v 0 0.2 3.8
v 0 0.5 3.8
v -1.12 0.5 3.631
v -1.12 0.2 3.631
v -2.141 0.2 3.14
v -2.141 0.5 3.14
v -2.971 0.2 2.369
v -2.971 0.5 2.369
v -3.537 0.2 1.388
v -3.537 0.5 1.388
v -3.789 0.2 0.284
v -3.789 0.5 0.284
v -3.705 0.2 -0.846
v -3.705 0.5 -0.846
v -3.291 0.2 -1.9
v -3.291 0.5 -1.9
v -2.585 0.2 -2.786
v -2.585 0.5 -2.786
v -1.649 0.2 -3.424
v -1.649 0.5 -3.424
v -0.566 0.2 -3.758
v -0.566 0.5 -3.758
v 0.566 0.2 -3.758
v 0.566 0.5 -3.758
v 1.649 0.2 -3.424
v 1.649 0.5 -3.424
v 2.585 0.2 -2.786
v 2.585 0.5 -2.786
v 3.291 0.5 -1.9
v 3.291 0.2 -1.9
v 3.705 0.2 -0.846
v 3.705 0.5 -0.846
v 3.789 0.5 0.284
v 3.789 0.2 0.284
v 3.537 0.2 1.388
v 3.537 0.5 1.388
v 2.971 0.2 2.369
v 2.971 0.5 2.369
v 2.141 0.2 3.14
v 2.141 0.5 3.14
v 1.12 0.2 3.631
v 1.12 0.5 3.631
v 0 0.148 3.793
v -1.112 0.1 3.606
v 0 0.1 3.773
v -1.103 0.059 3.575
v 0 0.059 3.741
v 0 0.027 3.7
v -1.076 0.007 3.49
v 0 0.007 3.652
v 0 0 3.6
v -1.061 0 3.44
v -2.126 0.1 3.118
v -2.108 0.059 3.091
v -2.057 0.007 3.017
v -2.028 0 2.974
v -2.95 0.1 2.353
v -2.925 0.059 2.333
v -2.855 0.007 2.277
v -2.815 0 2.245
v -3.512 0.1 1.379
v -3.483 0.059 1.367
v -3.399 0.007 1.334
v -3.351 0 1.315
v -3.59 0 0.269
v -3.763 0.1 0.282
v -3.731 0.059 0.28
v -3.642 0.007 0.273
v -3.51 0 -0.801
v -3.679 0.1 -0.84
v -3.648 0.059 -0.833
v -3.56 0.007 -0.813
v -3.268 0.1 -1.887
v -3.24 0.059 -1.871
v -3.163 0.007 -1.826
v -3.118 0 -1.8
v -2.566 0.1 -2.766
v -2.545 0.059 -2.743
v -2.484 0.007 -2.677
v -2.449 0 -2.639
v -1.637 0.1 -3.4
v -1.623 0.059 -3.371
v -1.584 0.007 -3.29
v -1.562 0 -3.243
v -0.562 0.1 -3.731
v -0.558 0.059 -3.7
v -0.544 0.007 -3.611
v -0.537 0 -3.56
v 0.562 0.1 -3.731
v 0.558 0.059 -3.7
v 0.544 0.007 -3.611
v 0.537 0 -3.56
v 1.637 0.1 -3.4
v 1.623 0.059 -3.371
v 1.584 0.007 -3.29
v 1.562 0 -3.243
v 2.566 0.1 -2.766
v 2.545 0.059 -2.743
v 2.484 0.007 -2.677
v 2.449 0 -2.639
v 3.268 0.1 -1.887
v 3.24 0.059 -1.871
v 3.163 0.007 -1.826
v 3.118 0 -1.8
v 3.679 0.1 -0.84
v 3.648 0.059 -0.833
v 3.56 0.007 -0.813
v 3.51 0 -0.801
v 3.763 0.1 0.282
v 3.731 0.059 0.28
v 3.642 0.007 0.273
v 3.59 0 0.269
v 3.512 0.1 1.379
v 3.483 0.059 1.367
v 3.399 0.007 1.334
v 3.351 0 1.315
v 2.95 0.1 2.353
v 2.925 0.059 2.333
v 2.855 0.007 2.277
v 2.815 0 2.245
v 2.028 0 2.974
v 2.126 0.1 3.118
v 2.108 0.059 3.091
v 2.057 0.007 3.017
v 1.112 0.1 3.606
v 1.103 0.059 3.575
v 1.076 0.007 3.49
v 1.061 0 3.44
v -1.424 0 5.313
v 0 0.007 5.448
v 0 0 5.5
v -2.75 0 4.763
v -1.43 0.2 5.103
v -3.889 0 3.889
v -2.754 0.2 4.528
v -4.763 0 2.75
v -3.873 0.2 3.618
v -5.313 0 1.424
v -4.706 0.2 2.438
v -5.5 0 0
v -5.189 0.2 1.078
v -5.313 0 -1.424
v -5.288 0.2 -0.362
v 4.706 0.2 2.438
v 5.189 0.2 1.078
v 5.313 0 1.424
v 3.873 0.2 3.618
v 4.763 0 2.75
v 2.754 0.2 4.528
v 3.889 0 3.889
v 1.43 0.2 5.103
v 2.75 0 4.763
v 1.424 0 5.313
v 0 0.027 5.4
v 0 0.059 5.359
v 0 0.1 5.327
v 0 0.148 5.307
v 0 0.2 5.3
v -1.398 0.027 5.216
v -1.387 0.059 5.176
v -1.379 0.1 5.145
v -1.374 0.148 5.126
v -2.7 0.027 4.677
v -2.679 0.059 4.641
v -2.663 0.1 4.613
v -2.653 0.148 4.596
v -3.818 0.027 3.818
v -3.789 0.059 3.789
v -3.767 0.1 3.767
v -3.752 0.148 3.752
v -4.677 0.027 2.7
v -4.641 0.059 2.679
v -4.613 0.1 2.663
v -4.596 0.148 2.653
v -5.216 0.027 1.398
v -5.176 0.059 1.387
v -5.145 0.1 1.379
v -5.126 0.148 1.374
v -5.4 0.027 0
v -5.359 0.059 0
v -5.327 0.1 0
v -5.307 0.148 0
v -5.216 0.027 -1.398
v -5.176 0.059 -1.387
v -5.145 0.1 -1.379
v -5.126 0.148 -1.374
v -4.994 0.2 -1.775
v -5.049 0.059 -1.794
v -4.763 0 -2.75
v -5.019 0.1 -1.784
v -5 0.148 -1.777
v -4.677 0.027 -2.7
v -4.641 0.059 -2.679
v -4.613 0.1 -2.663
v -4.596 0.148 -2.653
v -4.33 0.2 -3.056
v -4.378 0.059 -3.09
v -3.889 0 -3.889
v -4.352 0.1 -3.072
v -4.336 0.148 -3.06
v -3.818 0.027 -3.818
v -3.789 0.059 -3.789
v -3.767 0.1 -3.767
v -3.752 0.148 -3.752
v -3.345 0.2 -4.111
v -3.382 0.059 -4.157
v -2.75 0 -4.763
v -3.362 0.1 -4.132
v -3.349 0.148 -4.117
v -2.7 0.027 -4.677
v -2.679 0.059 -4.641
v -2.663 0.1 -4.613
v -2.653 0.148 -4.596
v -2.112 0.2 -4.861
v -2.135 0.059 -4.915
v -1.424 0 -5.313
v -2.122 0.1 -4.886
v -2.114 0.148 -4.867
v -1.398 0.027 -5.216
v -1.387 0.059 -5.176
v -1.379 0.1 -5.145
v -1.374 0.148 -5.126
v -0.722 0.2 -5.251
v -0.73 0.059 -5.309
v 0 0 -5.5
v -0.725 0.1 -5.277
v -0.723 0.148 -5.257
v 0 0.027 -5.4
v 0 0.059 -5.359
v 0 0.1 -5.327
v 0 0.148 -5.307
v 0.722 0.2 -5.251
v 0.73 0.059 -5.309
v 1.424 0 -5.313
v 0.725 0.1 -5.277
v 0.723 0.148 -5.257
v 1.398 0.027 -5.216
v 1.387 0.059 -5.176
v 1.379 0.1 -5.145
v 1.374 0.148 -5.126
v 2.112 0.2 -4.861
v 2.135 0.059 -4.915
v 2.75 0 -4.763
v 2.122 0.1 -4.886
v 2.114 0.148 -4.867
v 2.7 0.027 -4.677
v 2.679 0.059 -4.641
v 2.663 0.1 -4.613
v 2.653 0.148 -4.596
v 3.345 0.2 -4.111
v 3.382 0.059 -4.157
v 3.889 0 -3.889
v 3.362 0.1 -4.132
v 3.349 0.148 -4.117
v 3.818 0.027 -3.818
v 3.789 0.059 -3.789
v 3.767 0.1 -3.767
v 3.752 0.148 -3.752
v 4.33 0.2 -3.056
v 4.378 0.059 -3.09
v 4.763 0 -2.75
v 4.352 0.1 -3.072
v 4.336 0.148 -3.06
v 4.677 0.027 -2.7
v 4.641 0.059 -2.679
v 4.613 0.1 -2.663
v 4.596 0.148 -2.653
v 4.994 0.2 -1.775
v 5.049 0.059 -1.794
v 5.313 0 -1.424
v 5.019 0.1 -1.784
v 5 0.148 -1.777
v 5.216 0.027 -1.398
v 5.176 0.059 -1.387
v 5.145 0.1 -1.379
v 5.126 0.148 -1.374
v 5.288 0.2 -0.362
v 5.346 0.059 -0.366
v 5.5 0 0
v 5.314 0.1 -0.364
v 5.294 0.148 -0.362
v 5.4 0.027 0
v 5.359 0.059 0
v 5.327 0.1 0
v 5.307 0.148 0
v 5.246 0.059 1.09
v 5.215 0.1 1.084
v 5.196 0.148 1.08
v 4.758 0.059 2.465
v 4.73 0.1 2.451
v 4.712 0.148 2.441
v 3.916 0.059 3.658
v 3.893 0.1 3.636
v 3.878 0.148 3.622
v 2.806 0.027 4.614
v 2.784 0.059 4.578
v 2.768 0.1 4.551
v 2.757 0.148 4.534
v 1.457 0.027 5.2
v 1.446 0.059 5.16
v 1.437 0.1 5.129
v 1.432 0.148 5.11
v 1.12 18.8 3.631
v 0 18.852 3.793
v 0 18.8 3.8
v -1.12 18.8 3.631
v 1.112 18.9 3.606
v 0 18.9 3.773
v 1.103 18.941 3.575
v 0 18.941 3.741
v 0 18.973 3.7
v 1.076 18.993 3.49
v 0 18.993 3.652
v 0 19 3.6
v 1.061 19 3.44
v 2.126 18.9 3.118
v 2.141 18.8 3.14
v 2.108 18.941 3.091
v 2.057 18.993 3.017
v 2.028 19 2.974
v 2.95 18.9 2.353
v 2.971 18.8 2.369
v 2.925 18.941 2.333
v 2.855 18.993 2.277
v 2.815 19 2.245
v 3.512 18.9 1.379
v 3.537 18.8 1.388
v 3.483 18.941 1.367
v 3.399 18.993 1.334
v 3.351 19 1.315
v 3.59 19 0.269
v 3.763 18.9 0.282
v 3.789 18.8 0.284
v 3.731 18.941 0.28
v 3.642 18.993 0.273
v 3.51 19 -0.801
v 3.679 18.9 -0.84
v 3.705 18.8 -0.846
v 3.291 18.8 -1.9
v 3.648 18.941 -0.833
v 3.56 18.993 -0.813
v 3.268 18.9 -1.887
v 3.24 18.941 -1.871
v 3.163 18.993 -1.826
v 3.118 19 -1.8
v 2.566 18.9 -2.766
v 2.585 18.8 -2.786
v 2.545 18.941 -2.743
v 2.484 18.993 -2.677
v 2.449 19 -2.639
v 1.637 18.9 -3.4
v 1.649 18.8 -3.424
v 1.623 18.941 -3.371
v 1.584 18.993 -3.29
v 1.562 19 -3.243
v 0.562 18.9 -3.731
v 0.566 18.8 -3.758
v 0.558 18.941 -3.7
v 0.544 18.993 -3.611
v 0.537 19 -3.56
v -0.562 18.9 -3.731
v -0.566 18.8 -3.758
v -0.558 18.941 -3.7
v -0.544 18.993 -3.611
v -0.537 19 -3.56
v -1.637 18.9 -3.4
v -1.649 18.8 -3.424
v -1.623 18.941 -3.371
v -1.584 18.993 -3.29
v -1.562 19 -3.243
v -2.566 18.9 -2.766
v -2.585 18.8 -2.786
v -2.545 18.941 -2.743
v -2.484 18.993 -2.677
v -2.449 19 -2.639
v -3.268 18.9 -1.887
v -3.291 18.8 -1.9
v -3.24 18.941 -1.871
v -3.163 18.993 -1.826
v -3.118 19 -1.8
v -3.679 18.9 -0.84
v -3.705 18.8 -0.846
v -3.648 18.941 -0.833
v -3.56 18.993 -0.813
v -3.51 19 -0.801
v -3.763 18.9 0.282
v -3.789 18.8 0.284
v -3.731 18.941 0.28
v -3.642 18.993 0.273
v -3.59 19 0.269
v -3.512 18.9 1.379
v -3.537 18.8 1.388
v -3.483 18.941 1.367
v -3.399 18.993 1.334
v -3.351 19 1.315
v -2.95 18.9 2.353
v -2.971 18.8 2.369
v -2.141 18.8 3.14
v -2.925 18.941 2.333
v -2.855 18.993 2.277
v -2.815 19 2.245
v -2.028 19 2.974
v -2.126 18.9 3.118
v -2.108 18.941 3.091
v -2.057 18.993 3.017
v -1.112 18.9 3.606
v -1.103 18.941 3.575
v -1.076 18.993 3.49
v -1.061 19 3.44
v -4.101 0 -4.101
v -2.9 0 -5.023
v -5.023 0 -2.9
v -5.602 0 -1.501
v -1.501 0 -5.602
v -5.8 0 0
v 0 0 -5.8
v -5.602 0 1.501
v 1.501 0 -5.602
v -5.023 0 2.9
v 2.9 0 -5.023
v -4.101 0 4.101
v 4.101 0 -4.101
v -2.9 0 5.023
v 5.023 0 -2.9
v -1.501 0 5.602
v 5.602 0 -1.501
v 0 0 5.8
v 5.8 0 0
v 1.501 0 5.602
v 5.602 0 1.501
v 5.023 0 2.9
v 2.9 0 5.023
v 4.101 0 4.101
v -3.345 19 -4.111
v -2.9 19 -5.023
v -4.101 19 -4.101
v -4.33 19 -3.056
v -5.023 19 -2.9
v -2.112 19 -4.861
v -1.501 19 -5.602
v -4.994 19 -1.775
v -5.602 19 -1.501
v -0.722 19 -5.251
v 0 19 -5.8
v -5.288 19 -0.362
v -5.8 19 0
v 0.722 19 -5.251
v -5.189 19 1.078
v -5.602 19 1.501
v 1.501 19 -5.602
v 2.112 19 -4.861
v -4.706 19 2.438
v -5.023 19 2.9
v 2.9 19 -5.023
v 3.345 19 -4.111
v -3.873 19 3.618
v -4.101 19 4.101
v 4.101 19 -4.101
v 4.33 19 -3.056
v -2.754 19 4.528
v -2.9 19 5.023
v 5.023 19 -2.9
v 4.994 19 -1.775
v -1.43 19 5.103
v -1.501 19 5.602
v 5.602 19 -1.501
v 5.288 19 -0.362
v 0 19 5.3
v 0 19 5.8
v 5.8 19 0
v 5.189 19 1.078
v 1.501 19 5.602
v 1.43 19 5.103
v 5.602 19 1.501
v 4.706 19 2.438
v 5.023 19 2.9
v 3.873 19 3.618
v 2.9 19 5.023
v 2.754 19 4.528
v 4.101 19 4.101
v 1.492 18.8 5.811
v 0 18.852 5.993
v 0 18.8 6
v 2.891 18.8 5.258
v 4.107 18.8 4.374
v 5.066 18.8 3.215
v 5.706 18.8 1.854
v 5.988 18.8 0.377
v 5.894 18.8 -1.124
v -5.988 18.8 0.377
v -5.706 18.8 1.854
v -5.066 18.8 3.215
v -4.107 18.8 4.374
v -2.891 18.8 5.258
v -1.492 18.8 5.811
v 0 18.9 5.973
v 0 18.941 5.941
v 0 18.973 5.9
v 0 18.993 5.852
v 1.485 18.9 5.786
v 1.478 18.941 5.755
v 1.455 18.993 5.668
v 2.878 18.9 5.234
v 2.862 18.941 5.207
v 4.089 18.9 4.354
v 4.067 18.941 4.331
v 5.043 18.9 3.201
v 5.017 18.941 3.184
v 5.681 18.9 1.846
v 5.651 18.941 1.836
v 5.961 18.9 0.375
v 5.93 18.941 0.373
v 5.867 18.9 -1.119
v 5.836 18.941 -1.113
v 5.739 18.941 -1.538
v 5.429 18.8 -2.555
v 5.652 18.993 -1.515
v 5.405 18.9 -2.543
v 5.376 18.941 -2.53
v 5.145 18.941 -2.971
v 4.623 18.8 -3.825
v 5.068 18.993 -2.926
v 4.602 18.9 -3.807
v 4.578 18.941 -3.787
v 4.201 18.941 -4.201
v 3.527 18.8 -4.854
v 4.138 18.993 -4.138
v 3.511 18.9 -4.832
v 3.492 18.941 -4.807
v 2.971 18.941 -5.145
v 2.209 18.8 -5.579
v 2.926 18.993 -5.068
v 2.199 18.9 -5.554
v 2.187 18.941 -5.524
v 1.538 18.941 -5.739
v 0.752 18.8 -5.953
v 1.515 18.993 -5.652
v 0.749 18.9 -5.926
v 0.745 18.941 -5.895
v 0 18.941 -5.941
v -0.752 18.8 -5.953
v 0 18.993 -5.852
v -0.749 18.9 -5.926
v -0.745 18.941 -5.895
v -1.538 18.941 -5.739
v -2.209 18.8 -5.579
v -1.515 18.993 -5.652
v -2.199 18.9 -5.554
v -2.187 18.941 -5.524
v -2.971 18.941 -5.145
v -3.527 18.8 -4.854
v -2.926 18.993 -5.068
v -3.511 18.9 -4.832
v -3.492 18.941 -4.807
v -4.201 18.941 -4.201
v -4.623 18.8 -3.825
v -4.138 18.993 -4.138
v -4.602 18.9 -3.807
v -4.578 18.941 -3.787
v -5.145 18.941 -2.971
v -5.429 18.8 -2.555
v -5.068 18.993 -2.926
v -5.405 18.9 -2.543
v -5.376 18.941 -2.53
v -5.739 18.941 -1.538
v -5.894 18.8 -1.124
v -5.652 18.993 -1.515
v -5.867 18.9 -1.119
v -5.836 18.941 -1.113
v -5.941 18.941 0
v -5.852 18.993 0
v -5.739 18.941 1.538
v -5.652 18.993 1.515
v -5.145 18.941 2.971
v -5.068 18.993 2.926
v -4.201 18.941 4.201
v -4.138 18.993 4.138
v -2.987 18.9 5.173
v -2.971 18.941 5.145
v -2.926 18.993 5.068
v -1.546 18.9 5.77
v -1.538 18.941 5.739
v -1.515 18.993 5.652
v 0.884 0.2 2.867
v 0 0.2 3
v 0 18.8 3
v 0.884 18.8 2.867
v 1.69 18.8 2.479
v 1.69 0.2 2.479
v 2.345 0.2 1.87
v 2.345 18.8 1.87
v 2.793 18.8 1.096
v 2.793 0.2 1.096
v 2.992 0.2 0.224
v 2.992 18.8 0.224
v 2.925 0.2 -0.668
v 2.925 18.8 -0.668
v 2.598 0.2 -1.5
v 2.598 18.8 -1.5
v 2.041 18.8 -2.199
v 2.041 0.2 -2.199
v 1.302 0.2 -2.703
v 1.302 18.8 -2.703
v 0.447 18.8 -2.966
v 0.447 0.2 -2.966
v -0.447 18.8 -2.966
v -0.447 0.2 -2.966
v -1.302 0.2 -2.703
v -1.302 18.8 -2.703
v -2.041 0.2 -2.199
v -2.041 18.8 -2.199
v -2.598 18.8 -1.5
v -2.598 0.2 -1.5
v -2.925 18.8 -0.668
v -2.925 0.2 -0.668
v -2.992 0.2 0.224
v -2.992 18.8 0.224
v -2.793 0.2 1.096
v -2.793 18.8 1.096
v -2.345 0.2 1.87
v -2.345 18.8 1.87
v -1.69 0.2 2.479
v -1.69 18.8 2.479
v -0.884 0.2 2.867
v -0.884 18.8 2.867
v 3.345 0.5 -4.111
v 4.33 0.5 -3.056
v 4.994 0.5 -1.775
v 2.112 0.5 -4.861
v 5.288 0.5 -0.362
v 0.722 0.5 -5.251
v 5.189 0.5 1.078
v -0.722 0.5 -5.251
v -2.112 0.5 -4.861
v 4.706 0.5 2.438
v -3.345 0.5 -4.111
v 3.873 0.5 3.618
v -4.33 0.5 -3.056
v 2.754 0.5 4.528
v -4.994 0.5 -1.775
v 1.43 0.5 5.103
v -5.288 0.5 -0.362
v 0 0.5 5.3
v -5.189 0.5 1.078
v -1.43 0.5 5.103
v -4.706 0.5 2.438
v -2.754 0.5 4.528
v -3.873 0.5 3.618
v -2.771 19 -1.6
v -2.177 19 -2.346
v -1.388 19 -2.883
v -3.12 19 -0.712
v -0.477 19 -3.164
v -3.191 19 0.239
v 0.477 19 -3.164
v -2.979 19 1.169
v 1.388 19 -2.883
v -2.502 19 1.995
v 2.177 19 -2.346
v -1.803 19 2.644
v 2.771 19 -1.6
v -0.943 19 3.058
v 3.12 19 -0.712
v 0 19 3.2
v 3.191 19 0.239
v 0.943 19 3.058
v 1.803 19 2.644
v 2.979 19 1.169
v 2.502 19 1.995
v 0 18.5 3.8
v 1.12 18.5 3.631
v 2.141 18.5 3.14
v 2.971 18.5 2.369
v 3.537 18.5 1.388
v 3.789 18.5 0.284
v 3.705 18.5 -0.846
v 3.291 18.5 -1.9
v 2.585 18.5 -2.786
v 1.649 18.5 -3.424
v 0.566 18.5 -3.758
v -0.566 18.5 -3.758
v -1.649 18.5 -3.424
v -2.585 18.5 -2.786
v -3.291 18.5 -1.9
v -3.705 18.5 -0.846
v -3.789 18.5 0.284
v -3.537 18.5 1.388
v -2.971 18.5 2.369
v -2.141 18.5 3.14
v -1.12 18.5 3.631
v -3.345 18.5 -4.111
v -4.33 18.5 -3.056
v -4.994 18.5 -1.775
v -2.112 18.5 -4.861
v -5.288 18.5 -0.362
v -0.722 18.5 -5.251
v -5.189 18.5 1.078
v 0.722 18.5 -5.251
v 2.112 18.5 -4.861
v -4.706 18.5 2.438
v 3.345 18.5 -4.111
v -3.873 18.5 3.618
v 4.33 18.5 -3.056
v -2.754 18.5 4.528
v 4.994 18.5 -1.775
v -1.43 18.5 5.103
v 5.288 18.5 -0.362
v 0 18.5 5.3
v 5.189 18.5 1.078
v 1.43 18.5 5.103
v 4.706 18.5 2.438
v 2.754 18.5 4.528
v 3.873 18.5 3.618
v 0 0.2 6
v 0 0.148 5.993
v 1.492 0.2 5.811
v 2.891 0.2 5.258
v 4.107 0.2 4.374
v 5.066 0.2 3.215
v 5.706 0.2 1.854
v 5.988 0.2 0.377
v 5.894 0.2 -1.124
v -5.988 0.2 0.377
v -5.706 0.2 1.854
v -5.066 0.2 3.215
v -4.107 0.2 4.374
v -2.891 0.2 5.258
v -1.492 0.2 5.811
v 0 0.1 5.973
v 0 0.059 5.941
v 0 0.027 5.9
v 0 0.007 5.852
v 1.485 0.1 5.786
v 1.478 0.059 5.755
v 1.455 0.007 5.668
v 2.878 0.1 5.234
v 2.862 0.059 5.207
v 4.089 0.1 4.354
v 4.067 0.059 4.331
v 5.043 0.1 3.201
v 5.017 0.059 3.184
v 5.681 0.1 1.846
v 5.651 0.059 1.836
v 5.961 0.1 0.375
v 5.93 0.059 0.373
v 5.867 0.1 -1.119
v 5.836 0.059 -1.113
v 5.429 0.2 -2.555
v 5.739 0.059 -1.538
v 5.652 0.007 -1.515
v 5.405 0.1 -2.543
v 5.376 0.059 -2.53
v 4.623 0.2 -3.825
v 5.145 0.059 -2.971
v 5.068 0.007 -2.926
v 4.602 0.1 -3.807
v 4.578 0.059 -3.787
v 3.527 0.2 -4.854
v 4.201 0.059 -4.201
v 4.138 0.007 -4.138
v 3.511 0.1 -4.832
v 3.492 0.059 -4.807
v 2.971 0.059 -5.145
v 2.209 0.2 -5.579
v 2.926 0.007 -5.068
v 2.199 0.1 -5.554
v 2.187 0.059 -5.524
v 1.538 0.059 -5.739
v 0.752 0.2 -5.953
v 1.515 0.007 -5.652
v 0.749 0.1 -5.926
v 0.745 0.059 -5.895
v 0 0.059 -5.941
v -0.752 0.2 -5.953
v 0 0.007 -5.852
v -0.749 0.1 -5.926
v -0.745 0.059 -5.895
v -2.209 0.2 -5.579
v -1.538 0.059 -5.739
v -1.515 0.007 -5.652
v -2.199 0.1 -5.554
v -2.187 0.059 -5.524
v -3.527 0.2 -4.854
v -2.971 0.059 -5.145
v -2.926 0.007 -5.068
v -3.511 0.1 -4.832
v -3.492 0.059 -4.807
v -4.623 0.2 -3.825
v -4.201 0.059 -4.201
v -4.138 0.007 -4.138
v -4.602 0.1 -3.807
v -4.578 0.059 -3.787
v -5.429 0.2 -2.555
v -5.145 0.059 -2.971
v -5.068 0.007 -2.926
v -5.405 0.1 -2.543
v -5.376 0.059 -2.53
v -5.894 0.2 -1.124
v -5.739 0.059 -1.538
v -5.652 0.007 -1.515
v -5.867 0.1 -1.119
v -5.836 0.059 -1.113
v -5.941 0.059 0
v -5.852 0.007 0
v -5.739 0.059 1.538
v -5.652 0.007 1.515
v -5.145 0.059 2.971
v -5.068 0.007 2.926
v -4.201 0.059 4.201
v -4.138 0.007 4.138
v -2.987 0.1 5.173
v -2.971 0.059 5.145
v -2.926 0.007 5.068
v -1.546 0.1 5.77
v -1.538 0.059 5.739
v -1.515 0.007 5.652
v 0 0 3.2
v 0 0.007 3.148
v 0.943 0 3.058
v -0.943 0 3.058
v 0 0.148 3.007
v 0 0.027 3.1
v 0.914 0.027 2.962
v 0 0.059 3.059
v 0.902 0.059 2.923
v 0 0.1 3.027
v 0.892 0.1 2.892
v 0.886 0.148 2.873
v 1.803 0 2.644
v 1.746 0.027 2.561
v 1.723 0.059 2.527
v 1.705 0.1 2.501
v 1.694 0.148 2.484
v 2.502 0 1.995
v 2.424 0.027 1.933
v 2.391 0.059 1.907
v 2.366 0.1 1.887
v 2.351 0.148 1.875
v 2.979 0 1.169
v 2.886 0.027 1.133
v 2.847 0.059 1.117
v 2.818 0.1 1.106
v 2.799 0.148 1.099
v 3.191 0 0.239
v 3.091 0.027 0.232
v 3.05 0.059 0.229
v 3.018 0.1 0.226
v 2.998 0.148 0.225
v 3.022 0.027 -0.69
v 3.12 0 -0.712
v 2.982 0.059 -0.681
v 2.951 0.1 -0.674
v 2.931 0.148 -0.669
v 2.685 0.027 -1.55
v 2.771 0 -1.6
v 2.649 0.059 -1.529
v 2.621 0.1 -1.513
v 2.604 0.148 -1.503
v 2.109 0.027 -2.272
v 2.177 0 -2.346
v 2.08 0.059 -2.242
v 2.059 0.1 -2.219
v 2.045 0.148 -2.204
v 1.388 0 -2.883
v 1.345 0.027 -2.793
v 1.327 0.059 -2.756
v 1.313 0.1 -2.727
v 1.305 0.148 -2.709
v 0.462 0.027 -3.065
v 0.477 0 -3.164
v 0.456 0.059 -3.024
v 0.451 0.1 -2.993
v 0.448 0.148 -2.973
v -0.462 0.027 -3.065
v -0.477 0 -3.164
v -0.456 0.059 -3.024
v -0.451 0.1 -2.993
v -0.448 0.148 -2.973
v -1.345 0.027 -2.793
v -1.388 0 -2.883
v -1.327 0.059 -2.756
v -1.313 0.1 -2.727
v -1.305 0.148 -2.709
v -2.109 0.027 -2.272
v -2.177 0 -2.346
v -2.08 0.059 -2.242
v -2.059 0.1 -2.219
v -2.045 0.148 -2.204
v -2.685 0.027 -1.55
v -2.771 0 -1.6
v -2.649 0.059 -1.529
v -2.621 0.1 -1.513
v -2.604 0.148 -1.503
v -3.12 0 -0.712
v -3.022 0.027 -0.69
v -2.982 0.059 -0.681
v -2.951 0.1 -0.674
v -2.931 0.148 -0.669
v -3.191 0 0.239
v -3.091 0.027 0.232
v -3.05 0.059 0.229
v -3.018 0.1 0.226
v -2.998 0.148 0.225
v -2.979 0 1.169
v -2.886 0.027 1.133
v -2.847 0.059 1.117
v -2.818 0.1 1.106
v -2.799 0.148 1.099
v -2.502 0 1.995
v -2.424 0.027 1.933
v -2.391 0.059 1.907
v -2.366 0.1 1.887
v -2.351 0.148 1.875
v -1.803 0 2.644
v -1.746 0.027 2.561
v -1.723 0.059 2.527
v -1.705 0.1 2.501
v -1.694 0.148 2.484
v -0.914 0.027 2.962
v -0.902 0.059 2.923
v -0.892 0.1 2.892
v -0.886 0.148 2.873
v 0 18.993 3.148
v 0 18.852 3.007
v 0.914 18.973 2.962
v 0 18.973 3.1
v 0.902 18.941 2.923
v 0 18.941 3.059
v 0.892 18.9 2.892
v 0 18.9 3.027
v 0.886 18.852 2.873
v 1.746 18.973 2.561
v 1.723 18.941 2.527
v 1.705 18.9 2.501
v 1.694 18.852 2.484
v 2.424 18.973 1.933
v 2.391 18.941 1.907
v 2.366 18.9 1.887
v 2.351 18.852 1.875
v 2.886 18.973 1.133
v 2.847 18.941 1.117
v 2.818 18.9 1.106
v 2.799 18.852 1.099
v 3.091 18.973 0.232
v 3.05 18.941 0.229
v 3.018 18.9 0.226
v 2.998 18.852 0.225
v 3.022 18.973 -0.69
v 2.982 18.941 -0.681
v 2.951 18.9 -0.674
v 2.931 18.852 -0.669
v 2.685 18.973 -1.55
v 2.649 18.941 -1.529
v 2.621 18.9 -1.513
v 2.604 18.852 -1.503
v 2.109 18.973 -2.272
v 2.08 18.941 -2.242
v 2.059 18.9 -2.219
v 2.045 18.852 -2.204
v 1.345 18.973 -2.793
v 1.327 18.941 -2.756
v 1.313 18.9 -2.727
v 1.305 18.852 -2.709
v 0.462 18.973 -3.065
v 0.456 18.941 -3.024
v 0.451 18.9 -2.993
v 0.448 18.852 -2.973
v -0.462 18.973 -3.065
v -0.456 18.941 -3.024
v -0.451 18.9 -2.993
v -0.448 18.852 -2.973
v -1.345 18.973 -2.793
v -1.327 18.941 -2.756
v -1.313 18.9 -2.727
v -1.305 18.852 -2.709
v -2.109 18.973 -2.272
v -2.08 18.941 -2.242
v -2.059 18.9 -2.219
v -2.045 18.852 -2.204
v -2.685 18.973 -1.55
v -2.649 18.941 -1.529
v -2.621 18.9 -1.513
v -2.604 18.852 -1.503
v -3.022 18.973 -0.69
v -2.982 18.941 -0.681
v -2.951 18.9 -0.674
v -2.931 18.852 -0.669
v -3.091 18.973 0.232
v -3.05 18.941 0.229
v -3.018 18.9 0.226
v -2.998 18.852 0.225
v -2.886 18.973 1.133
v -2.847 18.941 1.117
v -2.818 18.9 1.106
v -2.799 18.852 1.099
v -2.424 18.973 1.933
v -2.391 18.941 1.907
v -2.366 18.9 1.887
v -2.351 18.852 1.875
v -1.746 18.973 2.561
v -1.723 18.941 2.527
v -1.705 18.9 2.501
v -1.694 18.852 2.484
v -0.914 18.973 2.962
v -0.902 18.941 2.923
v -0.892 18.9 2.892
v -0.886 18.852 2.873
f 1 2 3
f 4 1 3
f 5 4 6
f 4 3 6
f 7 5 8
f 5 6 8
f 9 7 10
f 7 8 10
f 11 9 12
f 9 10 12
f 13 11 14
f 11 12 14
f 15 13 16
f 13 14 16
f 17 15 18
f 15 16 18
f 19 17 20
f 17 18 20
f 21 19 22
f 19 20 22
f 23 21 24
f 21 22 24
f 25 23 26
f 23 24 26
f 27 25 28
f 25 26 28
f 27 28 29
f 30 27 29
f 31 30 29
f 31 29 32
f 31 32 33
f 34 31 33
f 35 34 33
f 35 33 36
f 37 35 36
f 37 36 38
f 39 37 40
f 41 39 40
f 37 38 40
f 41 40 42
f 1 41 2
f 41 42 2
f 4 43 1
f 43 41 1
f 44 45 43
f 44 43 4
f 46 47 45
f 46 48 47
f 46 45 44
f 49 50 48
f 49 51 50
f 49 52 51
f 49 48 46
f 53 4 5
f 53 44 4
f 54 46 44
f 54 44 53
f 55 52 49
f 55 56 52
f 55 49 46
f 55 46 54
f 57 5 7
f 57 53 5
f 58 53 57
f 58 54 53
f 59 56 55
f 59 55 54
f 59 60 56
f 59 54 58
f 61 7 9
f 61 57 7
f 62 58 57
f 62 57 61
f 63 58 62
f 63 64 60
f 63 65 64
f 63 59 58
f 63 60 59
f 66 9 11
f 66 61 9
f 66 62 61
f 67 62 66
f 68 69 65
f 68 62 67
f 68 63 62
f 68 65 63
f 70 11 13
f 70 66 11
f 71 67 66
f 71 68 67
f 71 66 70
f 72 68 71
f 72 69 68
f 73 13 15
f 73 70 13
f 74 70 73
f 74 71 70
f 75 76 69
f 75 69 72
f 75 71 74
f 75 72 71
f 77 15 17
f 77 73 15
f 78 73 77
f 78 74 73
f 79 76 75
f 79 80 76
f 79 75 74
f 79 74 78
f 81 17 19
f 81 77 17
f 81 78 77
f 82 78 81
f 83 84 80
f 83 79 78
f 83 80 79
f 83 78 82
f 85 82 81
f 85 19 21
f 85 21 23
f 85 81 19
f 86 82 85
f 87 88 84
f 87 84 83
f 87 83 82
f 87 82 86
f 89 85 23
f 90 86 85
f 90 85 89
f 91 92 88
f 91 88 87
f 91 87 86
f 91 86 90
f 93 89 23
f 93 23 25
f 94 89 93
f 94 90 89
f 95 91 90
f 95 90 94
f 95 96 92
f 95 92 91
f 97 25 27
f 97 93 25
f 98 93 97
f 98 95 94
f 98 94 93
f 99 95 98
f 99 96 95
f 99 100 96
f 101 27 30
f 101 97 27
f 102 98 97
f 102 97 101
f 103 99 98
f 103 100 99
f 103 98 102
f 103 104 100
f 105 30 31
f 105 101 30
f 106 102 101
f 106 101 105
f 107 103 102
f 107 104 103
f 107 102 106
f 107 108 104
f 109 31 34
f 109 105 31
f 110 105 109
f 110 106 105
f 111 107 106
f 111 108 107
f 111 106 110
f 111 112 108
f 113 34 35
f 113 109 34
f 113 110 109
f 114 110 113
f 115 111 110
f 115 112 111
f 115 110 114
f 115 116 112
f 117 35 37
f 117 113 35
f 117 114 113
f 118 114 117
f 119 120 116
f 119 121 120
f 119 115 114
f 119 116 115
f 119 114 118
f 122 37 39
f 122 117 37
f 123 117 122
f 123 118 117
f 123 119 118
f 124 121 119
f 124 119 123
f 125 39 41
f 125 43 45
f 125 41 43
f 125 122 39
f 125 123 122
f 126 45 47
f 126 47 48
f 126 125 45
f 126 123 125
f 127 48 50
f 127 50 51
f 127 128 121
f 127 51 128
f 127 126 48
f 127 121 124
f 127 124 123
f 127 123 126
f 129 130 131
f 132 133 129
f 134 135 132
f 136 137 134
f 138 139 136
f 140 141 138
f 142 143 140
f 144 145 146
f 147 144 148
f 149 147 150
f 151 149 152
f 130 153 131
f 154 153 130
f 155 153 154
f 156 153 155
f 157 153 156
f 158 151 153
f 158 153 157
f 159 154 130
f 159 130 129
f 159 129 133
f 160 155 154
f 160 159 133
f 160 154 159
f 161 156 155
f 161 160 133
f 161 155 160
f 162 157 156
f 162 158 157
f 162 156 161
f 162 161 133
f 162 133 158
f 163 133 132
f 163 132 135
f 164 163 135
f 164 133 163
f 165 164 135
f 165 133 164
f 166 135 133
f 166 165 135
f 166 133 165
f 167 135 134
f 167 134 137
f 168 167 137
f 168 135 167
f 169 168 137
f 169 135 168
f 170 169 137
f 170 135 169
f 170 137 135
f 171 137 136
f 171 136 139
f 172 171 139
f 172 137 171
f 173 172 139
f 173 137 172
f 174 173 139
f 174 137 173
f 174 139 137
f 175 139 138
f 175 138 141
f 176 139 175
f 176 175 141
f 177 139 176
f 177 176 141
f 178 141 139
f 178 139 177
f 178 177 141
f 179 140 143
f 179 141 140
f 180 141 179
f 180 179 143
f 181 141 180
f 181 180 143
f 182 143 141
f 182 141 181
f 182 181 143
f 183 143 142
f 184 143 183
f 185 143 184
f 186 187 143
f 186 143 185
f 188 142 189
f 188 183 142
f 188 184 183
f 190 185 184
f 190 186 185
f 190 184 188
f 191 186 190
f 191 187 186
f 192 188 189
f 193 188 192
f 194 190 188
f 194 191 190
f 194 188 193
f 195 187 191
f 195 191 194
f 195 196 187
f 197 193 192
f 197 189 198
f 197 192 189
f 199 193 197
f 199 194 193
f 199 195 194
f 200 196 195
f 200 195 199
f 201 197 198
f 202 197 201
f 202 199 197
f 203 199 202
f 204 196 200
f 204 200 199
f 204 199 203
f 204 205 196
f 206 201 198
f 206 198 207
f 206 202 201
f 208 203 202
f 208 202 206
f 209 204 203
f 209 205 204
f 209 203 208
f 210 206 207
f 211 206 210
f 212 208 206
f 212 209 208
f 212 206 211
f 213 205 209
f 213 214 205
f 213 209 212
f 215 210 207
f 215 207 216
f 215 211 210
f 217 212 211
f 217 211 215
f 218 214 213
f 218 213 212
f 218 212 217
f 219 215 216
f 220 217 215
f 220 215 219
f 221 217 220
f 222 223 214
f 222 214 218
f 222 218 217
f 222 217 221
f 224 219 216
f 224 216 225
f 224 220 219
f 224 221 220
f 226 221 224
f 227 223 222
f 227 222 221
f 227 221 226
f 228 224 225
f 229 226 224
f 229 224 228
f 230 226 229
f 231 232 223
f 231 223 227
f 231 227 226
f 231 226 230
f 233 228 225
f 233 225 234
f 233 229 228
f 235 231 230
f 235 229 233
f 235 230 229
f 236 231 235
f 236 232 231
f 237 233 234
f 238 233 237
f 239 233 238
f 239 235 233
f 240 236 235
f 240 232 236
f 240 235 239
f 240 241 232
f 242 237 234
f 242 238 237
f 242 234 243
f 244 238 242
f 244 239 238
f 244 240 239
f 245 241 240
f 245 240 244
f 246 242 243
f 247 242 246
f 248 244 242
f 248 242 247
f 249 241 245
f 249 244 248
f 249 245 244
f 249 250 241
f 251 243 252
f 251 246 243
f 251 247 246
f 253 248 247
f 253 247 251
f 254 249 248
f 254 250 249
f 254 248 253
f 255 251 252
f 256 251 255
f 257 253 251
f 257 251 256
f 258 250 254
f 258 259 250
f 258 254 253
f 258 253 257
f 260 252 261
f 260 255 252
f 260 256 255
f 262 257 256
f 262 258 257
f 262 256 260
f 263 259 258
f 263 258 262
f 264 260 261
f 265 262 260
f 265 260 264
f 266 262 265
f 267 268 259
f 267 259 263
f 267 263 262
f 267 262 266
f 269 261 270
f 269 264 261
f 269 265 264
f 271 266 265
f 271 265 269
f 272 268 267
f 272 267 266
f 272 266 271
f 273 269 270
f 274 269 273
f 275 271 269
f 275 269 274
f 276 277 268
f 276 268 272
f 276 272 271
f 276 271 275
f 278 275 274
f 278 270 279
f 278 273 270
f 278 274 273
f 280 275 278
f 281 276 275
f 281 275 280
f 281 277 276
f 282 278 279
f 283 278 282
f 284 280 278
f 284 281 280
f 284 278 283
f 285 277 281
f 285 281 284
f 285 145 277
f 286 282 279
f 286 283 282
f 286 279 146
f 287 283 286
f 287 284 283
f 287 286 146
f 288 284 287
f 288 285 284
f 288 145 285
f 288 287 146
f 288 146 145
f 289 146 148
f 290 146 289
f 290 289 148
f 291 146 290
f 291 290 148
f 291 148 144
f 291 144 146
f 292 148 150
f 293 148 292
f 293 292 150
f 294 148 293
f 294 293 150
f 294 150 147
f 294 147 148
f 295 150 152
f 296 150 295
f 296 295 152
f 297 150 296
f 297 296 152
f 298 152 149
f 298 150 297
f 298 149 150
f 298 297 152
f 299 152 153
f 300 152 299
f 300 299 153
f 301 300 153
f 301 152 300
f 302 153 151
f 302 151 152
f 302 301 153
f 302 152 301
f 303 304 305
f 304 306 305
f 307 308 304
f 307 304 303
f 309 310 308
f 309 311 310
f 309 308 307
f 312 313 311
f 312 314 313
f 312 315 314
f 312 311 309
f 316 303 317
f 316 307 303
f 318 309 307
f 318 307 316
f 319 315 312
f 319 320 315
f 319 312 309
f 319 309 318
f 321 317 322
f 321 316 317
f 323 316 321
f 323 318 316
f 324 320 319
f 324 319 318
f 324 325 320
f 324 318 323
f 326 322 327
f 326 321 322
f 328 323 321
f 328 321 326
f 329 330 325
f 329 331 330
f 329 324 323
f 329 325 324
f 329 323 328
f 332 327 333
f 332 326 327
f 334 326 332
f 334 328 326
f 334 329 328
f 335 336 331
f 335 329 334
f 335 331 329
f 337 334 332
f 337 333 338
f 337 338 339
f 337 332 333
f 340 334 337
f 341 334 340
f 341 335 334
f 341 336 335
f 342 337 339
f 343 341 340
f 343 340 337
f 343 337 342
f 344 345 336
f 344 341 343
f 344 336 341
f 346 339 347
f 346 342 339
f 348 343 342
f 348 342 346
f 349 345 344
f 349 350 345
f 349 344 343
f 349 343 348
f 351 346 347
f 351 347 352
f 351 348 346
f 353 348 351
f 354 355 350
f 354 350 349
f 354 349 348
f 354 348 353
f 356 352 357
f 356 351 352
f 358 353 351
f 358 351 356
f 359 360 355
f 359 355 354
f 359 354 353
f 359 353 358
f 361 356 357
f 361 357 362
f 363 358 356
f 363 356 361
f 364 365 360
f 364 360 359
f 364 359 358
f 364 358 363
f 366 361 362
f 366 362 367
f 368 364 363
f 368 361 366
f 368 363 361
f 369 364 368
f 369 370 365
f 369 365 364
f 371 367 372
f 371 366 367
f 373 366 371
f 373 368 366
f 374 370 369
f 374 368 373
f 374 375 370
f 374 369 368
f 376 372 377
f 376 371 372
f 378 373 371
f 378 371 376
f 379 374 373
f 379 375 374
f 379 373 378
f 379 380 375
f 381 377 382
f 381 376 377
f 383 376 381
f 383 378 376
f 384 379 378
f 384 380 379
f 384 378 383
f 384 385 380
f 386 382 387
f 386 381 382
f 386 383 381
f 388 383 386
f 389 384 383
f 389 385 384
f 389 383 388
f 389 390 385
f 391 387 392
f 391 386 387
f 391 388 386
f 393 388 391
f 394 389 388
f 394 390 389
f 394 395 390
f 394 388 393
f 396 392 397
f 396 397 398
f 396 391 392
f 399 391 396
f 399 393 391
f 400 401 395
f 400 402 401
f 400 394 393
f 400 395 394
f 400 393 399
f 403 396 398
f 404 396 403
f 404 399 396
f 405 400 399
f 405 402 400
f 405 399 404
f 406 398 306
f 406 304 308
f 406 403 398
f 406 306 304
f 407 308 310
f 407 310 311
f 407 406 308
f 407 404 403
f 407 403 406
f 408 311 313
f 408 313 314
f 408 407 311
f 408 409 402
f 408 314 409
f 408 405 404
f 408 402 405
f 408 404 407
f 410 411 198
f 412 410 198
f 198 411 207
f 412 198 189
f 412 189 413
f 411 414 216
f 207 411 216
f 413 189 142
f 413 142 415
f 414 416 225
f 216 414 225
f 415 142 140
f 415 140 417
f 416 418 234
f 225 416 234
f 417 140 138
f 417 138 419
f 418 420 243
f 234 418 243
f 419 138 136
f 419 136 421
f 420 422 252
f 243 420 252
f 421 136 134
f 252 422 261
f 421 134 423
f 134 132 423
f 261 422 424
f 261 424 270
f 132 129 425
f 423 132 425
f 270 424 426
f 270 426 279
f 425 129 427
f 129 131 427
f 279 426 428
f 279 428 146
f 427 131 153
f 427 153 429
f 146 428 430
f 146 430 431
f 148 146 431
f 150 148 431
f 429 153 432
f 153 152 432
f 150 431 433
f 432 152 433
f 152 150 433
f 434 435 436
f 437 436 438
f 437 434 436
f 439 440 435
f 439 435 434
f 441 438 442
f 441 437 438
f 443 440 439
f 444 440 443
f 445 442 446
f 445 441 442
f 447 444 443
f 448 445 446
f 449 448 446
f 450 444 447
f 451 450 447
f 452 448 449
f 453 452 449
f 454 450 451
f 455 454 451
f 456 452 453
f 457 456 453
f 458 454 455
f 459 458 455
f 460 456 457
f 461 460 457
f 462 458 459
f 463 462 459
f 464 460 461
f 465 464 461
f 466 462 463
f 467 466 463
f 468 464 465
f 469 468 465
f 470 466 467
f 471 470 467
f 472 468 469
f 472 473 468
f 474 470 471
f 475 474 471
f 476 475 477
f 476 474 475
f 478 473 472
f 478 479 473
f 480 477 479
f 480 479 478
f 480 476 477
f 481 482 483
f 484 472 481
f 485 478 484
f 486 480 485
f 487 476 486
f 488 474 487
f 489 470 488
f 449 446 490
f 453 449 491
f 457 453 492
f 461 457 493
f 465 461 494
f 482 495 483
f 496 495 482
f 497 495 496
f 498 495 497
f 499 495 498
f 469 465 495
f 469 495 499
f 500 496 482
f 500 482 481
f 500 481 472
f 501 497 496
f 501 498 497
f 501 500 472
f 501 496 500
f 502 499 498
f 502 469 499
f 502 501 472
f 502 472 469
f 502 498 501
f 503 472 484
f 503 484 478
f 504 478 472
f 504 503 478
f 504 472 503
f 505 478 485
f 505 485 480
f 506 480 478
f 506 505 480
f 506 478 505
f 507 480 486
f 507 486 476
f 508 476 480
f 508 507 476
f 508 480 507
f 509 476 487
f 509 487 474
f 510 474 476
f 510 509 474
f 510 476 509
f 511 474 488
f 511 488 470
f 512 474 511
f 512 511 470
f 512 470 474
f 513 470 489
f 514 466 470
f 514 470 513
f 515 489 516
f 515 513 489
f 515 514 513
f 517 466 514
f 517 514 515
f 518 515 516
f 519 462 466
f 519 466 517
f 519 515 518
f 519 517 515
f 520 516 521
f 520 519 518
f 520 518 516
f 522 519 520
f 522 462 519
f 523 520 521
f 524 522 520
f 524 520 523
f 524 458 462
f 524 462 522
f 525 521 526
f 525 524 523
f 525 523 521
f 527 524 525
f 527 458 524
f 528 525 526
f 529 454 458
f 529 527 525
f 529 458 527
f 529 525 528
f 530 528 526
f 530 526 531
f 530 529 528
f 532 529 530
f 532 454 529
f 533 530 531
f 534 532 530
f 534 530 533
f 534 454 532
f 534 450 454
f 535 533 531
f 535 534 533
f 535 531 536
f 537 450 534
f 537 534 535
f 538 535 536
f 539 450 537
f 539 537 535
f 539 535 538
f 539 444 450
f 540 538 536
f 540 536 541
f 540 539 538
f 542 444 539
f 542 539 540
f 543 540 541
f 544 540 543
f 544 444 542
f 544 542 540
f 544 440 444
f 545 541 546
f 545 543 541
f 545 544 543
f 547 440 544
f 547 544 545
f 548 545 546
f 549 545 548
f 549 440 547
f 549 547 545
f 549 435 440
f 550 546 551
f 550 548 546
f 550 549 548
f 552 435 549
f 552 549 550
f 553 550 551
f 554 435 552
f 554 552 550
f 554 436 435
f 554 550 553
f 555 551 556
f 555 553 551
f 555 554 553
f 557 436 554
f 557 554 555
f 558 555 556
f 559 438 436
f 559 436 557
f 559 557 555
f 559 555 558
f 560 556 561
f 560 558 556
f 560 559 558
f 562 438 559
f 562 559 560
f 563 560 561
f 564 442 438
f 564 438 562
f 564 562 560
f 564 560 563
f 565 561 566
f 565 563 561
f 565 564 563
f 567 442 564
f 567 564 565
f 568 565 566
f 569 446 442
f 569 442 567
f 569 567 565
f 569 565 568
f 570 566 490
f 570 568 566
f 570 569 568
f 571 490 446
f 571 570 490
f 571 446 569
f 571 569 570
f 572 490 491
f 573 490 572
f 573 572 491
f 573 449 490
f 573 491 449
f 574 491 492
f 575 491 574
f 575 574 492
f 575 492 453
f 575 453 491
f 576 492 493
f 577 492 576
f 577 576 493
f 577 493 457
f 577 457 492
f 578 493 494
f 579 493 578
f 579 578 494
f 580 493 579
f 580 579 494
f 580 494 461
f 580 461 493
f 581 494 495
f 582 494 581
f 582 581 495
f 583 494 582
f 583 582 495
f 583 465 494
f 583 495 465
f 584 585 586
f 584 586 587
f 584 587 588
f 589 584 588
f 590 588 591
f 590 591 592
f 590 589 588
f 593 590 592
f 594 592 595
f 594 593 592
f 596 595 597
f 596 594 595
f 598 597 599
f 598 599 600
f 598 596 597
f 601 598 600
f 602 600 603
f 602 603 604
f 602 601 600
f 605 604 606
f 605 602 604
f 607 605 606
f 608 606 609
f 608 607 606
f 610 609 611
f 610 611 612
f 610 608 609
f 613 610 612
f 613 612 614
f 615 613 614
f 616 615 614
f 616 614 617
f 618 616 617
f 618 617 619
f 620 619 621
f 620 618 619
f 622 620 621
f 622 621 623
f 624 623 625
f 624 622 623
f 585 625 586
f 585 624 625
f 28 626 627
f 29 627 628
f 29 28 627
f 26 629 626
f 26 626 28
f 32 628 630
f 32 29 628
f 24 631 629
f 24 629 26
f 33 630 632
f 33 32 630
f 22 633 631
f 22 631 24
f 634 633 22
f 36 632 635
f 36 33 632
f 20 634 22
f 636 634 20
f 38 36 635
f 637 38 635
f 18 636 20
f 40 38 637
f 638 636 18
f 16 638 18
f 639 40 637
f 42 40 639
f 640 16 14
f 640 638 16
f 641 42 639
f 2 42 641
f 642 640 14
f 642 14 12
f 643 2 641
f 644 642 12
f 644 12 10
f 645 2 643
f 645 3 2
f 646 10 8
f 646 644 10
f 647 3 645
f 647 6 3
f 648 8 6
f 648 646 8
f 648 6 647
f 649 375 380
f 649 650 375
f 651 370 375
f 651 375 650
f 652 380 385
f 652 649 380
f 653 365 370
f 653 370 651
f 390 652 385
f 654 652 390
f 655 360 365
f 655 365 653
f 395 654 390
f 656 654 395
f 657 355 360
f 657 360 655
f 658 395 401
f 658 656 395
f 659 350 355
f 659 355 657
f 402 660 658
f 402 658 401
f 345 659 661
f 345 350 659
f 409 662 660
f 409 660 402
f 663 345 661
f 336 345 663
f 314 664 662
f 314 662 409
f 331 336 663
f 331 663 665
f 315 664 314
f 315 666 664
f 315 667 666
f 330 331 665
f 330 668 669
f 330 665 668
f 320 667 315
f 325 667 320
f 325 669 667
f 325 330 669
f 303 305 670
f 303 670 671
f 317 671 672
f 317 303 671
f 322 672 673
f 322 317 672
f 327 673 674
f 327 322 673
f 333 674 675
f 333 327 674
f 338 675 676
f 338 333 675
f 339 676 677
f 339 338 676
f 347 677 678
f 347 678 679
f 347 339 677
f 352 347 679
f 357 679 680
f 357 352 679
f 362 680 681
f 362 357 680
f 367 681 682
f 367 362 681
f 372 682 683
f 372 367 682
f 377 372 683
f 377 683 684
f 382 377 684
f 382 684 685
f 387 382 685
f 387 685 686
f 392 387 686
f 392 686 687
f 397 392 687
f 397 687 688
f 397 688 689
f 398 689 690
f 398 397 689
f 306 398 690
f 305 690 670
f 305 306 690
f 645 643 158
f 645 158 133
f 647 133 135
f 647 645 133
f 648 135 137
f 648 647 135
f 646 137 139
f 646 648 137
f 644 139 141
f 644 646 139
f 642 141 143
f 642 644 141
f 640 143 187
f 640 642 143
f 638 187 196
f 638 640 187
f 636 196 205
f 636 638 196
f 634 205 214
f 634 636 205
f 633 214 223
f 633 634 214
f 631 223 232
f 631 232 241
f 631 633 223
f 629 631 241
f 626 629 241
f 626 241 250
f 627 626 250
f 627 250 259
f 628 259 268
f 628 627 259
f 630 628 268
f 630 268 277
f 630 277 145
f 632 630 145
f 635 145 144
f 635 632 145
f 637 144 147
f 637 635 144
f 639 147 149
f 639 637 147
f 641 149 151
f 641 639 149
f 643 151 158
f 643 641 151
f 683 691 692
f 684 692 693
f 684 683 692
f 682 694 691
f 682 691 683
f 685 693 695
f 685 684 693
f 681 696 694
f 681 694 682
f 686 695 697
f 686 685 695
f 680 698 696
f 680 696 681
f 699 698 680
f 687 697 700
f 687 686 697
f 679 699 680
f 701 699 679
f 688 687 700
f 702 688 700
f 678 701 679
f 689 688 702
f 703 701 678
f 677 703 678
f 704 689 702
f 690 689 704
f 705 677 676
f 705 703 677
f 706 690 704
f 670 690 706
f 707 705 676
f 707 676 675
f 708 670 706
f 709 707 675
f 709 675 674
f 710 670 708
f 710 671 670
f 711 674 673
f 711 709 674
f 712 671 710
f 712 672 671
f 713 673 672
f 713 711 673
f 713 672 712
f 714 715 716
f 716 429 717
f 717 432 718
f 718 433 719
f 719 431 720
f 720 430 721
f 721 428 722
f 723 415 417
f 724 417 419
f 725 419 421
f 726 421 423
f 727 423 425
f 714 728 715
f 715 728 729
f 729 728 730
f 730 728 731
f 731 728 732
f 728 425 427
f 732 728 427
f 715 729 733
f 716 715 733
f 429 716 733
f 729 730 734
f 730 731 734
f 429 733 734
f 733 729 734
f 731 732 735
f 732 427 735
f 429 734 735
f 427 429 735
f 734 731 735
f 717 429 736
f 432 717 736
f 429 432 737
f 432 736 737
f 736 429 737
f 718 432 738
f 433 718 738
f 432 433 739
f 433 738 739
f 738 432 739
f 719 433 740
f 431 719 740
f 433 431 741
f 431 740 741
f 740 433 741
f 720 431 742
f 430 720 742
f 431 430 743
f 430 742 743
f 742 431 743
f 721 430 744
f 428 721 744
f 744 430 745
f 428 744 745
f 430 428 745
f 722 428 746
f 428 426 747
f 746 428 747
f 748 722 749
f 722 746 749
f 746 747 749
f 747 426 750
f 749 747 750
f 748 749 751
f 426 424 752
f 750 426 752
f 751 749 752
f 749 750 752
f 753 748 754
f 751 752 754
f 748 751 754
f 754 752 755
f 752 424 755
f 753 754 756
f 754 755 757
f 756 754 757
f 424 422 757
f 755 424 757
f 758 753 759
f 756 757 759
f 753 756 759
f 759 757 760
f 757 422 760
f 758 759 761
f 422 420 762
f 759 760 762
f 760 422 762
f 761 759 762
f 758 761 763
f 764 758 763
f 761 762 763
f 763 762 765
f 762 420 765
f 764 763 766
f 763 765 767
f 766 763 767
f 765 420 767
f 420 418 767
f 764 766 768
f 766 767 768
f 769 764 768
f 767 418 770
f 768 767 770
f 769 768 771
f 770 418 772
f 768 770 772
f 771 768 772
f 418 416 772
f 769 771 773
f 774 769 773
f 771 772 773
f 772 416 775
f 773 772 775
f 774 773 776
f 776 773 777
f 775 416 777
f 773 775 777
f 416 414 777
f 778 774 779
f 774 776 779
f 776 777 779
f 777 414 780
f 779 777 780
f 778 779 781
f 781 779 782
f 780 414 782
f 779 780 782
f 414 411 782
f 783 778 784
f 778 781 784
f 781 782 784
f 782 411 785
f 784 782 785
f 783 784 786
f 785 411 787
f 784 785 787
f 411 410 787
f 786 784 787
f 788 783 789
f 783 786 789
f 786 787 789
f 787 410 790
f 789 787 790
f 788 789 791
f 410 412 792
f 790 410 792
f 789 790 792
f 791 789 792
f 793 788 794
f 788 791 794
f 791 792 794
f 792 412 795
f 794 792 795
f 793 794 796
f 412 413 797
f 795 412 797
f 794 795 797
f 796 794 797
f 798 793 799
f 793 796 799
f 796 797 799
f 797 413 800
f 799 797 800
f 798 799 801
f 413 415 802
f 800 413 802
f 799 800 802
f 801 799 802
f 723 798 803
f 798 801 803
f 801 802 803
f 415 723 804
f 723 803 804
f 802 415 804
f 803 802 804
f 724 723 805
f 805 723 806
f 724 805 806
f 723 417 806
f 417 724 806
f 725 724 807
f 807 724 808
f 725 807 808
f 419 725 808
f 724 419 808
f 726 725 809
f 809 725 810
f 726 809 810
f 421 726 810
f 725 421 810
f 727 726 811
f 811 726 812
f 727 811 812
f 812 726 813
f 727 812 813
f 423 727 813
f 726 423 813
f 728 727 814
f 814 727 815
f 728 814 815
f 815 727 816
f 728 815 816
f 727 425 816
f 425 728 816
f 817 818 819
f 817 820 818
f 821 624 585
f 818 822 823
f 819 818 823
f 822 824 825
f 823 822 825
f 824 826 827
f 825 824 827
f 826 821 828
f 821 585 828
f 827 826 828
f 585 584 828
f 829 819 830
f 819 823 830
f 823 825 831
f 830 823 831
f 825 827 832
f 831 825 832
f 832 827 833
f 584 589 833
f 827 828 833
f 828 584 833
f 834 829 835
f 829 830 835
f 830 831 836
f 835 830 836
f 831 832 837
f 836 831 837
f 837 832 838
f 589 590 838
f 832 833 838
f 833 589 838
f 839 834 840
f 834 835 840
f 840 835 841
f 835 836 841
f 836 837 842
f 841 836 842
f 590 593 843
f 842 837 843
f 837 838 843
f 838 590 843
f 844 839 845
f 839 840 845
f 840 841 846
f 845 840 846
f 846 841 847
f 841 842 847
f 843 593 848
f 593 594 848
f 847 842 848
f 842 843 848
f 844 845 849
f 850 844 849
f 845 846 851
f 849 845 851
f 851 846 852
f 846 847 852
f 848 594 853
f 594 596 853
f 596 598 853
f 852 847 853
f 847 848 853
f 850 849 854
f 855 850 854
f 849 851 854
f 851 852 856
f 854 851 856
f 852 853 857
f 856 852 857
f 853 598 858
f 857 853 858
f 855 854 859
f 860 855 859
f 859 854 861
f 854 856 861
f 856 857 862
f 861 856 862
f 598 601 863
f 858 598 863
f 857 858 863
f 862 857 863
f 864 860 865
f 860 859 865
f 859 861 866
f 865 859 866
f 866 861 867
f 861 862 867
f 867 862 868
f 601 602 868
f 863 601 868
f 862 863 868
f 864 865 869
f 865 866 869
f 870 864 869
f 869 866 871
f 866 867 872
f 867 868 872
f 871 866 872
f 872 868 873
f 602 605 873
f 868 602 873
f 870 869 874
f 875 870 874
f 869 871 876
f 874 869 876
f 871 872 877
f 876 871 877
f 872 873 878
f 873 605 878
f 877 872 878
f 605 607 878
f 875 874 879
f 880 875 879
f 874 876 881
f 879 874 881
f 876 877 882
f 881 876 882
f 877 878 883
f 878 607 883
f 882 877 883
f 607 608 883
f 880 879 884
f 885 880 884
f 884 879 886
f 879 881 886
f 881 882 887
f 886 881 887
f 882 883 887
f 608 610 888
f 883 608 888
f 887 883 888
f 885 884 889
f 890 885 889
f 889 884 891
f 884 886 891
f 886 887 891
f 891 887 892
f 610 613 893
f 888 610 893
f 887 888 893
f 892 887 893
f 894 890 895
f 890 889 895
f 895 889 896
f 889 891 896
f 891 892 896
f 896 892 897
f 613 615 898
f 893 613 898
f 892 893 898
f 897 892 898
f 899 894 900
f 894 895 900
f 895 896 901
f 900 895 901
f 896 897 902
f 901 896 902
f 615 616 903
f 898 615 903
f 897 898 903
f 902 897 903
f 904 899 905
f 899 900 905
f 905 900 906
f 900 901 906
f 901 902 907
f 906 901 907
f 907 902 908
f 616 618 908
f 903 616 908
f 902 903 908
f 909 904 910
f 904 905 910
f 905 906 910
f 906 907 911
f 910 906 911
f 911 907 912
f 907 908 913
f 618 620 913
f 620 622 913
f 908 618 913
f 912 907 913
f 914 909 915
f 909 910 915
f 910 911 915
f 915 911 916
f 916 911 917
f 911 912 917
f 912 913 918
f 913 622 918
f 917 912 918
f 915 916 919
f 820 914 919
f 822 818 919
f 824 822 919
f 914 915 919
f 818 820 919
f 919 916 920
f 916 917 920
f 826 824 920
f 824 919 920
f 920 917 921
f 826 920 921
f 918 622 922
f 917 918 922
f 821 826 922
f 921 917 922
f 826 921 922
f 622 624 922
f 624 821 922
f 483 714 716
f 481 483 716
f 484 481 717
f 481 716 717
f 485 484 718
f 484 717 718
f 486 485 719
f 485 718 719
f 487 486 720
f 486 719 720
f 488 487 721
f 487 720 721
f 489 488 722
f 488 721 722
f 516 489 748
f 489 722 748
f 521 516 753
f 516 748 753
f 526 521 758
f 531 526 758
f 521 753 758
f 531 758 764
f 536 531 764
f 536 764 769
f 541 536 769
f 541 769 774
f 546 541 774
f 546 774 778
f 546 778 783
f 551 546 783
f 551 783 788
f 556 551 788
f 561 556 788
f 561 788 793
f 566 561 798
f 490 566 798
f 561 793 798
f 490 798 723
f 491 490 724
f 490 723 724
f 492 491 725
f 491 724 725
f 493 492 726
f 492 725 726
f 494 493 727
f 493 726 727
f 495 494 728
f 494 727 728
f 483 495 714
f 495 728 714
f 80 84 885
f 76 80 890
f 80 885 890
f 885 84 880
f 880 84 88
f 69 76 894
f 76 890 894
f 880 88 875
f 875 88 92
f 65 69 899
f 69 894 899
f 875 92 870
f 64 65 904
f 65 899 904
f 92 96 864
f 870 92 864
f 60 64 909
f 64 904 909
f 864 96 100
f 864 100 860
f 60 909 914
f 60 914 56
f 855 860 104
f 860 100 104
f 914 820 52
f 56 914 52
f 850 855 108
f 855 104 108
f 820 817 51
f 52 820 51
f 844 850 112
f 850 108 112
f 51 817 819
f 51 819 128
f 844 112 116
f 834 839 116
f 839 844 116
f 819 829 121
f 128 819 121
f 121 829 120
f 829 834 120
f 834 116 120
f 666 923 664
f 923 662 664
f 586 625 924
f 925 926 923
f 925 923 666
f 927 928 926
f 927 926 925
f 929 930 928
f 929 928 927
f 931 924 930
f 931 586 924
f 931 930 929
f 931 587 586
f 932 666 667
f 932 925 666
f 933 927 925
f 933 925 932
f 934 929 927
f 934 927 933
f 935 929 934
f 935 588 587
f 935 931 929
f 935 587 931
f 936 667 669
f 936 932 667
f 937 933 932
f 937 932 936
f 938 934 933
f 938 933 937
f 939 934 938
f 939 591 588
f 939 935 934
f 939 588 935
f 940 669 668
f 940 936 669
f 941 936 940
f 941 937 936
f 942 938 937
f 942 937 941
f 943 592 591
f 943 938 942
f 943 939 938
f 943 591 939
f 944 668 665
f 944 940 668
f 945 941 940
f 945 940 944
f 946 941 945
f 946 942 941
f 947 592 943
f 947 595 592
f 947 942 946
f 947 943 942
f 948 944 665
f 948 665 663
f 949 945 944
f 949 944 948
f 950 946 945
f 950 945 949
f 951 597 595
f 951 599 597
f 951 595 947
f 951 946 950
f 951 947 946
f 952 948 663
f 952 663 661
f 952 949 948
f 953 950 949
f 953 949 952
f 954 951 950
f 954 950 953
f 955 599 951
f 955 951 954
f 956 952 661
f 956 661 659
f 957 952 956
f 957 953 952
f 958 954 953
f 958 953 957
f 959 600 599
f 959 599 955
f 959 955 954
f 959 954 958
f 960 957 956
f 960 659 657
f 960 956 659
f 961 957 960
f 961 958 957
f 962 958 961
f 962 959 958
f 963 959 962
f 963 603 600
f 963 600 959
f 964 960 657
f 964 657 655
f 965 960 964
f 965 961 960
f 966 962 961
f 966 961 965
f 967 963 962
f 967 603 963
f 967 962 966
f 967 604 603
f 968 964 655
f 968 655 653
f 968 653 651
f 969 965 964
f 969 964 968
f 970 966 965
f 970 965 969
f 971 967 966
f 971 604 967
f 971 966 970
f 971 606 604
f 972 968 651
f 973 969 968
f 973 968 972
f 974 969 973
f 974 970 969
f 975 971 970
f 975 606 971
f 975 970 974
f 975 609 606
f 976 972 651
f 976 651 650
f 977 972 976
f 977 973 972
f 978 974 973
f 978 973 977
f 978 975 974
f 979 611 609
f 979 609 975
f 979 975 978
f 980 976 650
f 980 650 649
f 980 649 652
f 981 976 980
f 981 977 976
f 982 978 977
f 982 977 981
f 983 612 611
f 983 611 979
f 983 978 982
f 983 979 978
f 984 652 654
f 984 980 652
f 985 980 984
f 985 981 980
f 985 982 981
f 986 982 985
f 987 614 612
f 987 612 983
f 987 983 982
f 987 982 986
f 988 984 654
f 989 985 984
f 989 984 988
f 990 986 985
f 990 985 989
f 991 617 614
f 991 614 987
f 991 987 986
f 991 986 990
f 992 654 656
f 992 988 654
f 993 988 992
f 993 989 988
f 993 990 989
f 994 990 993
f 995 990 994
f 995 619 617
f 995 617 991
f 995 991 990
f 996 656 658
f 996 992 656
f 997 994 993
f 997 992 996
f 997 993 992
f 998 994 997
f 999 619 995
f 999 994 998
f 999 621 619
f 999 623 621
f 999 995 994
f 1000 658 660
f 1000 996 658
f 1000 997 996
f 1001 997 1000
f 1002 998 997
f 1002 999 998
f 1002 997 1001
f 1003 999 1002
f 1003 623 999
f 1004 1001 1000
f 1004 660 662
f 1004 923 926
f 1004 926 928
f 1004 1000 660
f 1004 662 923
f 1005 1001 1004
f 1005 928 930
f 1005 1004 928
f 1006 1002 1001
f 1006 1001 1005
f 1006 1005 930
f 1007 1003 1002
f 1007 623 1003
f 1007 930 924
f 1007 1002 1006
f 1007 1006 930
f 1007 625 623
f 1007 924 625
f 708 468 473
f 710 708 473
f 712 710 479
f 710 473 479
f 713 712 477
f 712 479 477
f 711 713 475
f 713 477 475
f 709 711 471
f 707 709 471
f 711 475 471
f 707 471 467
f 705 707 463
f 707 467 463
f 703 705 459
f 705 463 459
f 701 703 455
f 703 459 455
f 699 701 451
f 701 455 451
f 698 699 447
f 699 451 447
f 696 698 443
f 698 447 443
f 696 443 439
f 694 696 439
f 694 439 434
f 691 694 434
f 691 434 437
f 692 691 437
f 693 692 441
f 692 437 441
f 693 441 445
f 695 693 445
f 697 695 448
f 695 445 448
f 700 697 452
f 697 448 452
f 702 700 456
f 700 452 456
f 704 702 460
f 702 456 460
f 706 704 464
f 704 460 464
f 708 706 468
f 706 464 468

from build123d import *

# Parameters (mm, degrees)
SKETCH1_R           = 6
SKETCH1_R_2         = 3
BOSS_EXTRUDE1_DEPTH = 19
SKETCH2_R           = 5.3
SKETCH2_R_2         = 3.8
CUT_EXTRUDE1_DEPTH  = 0.5
CUT_EXTRUDE2_START  = -0.5
SKETCH3_R           = 5.3
SKETCH3_R_2         = 3.8
CUT_EXTRUDE2_DEPTH  = 0.5
FILLET1_R           = 0.2


with BuildPart() as part:
    # Sketch1 → Boss-Extrude1 (new body)
    with BuildSketch(Plane(origin=(0, 0, 0), x_dir=(1, 0, 0), z_dir=(0, 1, 0))):
        with Locations(Location((0, 0, 0), (0, 0, 270))):
            Circle(SKETCH1_R)
        with Locations(Location((0, 0, 0), (0, 0, 270))):
            Circle(SKETCH1_R_2, mode=Mode.SUBTRACT)
    extrude(amount=BOSS_EXTRUDE1_DEPTH)

    # Sketch2 → Cut-Extrude1 (cut)
    with BuildSketch(Plane(origin=(0, 19, 0), x_dir=(1, 0, 0), z_dir=(0, 1, 0))):
        with Locations(Location((0, 0, 0), (0, 0, 270))):
            Circle(SKETCH2_R)
        with Locations(Location((0, 0, 0), (0, 0, 270))):
            Circle(SKETCH2_R_2, mode=Mode.SUBTRACT)
    extrude(amount=-CUT_EXTRUDE1_DEPTH, mode=Mode.SUBTRACT)

    # Sketch3 → Cut-Extrude2 (cut)
    with BuildSketch(Plane.XZ.offset(CUT_EXTRUDE2_START)):
        with Locations(Location((0, 0, 0), (0, 0, 90))):
            Circle(SKETCH3_R)
        with Locations(Location((0, 0, 0), (0, 0, 90))):
            Circle(SKETCH3_R_2, mode=Mode.SUBTRACT)
    extrude(amount=CUT_EXTRUDE2_DEPTH, mode=Mode.SUBTRACT)

    # Fillet1
    fillet1_edges = [part.edges().sort_by_distance(p)[0] for p in [
        (0, 19, -3.8),
        (0, 0, -5.3),
        (0, 0, -3.8),
        (0, 0, -6),
        (0, 19, -6),
        (0, 0, -3),
        (0, 19, -3),
    ]]
    fillet(fillet1_edges, radius=FILLET1_R)


solid = part.part
